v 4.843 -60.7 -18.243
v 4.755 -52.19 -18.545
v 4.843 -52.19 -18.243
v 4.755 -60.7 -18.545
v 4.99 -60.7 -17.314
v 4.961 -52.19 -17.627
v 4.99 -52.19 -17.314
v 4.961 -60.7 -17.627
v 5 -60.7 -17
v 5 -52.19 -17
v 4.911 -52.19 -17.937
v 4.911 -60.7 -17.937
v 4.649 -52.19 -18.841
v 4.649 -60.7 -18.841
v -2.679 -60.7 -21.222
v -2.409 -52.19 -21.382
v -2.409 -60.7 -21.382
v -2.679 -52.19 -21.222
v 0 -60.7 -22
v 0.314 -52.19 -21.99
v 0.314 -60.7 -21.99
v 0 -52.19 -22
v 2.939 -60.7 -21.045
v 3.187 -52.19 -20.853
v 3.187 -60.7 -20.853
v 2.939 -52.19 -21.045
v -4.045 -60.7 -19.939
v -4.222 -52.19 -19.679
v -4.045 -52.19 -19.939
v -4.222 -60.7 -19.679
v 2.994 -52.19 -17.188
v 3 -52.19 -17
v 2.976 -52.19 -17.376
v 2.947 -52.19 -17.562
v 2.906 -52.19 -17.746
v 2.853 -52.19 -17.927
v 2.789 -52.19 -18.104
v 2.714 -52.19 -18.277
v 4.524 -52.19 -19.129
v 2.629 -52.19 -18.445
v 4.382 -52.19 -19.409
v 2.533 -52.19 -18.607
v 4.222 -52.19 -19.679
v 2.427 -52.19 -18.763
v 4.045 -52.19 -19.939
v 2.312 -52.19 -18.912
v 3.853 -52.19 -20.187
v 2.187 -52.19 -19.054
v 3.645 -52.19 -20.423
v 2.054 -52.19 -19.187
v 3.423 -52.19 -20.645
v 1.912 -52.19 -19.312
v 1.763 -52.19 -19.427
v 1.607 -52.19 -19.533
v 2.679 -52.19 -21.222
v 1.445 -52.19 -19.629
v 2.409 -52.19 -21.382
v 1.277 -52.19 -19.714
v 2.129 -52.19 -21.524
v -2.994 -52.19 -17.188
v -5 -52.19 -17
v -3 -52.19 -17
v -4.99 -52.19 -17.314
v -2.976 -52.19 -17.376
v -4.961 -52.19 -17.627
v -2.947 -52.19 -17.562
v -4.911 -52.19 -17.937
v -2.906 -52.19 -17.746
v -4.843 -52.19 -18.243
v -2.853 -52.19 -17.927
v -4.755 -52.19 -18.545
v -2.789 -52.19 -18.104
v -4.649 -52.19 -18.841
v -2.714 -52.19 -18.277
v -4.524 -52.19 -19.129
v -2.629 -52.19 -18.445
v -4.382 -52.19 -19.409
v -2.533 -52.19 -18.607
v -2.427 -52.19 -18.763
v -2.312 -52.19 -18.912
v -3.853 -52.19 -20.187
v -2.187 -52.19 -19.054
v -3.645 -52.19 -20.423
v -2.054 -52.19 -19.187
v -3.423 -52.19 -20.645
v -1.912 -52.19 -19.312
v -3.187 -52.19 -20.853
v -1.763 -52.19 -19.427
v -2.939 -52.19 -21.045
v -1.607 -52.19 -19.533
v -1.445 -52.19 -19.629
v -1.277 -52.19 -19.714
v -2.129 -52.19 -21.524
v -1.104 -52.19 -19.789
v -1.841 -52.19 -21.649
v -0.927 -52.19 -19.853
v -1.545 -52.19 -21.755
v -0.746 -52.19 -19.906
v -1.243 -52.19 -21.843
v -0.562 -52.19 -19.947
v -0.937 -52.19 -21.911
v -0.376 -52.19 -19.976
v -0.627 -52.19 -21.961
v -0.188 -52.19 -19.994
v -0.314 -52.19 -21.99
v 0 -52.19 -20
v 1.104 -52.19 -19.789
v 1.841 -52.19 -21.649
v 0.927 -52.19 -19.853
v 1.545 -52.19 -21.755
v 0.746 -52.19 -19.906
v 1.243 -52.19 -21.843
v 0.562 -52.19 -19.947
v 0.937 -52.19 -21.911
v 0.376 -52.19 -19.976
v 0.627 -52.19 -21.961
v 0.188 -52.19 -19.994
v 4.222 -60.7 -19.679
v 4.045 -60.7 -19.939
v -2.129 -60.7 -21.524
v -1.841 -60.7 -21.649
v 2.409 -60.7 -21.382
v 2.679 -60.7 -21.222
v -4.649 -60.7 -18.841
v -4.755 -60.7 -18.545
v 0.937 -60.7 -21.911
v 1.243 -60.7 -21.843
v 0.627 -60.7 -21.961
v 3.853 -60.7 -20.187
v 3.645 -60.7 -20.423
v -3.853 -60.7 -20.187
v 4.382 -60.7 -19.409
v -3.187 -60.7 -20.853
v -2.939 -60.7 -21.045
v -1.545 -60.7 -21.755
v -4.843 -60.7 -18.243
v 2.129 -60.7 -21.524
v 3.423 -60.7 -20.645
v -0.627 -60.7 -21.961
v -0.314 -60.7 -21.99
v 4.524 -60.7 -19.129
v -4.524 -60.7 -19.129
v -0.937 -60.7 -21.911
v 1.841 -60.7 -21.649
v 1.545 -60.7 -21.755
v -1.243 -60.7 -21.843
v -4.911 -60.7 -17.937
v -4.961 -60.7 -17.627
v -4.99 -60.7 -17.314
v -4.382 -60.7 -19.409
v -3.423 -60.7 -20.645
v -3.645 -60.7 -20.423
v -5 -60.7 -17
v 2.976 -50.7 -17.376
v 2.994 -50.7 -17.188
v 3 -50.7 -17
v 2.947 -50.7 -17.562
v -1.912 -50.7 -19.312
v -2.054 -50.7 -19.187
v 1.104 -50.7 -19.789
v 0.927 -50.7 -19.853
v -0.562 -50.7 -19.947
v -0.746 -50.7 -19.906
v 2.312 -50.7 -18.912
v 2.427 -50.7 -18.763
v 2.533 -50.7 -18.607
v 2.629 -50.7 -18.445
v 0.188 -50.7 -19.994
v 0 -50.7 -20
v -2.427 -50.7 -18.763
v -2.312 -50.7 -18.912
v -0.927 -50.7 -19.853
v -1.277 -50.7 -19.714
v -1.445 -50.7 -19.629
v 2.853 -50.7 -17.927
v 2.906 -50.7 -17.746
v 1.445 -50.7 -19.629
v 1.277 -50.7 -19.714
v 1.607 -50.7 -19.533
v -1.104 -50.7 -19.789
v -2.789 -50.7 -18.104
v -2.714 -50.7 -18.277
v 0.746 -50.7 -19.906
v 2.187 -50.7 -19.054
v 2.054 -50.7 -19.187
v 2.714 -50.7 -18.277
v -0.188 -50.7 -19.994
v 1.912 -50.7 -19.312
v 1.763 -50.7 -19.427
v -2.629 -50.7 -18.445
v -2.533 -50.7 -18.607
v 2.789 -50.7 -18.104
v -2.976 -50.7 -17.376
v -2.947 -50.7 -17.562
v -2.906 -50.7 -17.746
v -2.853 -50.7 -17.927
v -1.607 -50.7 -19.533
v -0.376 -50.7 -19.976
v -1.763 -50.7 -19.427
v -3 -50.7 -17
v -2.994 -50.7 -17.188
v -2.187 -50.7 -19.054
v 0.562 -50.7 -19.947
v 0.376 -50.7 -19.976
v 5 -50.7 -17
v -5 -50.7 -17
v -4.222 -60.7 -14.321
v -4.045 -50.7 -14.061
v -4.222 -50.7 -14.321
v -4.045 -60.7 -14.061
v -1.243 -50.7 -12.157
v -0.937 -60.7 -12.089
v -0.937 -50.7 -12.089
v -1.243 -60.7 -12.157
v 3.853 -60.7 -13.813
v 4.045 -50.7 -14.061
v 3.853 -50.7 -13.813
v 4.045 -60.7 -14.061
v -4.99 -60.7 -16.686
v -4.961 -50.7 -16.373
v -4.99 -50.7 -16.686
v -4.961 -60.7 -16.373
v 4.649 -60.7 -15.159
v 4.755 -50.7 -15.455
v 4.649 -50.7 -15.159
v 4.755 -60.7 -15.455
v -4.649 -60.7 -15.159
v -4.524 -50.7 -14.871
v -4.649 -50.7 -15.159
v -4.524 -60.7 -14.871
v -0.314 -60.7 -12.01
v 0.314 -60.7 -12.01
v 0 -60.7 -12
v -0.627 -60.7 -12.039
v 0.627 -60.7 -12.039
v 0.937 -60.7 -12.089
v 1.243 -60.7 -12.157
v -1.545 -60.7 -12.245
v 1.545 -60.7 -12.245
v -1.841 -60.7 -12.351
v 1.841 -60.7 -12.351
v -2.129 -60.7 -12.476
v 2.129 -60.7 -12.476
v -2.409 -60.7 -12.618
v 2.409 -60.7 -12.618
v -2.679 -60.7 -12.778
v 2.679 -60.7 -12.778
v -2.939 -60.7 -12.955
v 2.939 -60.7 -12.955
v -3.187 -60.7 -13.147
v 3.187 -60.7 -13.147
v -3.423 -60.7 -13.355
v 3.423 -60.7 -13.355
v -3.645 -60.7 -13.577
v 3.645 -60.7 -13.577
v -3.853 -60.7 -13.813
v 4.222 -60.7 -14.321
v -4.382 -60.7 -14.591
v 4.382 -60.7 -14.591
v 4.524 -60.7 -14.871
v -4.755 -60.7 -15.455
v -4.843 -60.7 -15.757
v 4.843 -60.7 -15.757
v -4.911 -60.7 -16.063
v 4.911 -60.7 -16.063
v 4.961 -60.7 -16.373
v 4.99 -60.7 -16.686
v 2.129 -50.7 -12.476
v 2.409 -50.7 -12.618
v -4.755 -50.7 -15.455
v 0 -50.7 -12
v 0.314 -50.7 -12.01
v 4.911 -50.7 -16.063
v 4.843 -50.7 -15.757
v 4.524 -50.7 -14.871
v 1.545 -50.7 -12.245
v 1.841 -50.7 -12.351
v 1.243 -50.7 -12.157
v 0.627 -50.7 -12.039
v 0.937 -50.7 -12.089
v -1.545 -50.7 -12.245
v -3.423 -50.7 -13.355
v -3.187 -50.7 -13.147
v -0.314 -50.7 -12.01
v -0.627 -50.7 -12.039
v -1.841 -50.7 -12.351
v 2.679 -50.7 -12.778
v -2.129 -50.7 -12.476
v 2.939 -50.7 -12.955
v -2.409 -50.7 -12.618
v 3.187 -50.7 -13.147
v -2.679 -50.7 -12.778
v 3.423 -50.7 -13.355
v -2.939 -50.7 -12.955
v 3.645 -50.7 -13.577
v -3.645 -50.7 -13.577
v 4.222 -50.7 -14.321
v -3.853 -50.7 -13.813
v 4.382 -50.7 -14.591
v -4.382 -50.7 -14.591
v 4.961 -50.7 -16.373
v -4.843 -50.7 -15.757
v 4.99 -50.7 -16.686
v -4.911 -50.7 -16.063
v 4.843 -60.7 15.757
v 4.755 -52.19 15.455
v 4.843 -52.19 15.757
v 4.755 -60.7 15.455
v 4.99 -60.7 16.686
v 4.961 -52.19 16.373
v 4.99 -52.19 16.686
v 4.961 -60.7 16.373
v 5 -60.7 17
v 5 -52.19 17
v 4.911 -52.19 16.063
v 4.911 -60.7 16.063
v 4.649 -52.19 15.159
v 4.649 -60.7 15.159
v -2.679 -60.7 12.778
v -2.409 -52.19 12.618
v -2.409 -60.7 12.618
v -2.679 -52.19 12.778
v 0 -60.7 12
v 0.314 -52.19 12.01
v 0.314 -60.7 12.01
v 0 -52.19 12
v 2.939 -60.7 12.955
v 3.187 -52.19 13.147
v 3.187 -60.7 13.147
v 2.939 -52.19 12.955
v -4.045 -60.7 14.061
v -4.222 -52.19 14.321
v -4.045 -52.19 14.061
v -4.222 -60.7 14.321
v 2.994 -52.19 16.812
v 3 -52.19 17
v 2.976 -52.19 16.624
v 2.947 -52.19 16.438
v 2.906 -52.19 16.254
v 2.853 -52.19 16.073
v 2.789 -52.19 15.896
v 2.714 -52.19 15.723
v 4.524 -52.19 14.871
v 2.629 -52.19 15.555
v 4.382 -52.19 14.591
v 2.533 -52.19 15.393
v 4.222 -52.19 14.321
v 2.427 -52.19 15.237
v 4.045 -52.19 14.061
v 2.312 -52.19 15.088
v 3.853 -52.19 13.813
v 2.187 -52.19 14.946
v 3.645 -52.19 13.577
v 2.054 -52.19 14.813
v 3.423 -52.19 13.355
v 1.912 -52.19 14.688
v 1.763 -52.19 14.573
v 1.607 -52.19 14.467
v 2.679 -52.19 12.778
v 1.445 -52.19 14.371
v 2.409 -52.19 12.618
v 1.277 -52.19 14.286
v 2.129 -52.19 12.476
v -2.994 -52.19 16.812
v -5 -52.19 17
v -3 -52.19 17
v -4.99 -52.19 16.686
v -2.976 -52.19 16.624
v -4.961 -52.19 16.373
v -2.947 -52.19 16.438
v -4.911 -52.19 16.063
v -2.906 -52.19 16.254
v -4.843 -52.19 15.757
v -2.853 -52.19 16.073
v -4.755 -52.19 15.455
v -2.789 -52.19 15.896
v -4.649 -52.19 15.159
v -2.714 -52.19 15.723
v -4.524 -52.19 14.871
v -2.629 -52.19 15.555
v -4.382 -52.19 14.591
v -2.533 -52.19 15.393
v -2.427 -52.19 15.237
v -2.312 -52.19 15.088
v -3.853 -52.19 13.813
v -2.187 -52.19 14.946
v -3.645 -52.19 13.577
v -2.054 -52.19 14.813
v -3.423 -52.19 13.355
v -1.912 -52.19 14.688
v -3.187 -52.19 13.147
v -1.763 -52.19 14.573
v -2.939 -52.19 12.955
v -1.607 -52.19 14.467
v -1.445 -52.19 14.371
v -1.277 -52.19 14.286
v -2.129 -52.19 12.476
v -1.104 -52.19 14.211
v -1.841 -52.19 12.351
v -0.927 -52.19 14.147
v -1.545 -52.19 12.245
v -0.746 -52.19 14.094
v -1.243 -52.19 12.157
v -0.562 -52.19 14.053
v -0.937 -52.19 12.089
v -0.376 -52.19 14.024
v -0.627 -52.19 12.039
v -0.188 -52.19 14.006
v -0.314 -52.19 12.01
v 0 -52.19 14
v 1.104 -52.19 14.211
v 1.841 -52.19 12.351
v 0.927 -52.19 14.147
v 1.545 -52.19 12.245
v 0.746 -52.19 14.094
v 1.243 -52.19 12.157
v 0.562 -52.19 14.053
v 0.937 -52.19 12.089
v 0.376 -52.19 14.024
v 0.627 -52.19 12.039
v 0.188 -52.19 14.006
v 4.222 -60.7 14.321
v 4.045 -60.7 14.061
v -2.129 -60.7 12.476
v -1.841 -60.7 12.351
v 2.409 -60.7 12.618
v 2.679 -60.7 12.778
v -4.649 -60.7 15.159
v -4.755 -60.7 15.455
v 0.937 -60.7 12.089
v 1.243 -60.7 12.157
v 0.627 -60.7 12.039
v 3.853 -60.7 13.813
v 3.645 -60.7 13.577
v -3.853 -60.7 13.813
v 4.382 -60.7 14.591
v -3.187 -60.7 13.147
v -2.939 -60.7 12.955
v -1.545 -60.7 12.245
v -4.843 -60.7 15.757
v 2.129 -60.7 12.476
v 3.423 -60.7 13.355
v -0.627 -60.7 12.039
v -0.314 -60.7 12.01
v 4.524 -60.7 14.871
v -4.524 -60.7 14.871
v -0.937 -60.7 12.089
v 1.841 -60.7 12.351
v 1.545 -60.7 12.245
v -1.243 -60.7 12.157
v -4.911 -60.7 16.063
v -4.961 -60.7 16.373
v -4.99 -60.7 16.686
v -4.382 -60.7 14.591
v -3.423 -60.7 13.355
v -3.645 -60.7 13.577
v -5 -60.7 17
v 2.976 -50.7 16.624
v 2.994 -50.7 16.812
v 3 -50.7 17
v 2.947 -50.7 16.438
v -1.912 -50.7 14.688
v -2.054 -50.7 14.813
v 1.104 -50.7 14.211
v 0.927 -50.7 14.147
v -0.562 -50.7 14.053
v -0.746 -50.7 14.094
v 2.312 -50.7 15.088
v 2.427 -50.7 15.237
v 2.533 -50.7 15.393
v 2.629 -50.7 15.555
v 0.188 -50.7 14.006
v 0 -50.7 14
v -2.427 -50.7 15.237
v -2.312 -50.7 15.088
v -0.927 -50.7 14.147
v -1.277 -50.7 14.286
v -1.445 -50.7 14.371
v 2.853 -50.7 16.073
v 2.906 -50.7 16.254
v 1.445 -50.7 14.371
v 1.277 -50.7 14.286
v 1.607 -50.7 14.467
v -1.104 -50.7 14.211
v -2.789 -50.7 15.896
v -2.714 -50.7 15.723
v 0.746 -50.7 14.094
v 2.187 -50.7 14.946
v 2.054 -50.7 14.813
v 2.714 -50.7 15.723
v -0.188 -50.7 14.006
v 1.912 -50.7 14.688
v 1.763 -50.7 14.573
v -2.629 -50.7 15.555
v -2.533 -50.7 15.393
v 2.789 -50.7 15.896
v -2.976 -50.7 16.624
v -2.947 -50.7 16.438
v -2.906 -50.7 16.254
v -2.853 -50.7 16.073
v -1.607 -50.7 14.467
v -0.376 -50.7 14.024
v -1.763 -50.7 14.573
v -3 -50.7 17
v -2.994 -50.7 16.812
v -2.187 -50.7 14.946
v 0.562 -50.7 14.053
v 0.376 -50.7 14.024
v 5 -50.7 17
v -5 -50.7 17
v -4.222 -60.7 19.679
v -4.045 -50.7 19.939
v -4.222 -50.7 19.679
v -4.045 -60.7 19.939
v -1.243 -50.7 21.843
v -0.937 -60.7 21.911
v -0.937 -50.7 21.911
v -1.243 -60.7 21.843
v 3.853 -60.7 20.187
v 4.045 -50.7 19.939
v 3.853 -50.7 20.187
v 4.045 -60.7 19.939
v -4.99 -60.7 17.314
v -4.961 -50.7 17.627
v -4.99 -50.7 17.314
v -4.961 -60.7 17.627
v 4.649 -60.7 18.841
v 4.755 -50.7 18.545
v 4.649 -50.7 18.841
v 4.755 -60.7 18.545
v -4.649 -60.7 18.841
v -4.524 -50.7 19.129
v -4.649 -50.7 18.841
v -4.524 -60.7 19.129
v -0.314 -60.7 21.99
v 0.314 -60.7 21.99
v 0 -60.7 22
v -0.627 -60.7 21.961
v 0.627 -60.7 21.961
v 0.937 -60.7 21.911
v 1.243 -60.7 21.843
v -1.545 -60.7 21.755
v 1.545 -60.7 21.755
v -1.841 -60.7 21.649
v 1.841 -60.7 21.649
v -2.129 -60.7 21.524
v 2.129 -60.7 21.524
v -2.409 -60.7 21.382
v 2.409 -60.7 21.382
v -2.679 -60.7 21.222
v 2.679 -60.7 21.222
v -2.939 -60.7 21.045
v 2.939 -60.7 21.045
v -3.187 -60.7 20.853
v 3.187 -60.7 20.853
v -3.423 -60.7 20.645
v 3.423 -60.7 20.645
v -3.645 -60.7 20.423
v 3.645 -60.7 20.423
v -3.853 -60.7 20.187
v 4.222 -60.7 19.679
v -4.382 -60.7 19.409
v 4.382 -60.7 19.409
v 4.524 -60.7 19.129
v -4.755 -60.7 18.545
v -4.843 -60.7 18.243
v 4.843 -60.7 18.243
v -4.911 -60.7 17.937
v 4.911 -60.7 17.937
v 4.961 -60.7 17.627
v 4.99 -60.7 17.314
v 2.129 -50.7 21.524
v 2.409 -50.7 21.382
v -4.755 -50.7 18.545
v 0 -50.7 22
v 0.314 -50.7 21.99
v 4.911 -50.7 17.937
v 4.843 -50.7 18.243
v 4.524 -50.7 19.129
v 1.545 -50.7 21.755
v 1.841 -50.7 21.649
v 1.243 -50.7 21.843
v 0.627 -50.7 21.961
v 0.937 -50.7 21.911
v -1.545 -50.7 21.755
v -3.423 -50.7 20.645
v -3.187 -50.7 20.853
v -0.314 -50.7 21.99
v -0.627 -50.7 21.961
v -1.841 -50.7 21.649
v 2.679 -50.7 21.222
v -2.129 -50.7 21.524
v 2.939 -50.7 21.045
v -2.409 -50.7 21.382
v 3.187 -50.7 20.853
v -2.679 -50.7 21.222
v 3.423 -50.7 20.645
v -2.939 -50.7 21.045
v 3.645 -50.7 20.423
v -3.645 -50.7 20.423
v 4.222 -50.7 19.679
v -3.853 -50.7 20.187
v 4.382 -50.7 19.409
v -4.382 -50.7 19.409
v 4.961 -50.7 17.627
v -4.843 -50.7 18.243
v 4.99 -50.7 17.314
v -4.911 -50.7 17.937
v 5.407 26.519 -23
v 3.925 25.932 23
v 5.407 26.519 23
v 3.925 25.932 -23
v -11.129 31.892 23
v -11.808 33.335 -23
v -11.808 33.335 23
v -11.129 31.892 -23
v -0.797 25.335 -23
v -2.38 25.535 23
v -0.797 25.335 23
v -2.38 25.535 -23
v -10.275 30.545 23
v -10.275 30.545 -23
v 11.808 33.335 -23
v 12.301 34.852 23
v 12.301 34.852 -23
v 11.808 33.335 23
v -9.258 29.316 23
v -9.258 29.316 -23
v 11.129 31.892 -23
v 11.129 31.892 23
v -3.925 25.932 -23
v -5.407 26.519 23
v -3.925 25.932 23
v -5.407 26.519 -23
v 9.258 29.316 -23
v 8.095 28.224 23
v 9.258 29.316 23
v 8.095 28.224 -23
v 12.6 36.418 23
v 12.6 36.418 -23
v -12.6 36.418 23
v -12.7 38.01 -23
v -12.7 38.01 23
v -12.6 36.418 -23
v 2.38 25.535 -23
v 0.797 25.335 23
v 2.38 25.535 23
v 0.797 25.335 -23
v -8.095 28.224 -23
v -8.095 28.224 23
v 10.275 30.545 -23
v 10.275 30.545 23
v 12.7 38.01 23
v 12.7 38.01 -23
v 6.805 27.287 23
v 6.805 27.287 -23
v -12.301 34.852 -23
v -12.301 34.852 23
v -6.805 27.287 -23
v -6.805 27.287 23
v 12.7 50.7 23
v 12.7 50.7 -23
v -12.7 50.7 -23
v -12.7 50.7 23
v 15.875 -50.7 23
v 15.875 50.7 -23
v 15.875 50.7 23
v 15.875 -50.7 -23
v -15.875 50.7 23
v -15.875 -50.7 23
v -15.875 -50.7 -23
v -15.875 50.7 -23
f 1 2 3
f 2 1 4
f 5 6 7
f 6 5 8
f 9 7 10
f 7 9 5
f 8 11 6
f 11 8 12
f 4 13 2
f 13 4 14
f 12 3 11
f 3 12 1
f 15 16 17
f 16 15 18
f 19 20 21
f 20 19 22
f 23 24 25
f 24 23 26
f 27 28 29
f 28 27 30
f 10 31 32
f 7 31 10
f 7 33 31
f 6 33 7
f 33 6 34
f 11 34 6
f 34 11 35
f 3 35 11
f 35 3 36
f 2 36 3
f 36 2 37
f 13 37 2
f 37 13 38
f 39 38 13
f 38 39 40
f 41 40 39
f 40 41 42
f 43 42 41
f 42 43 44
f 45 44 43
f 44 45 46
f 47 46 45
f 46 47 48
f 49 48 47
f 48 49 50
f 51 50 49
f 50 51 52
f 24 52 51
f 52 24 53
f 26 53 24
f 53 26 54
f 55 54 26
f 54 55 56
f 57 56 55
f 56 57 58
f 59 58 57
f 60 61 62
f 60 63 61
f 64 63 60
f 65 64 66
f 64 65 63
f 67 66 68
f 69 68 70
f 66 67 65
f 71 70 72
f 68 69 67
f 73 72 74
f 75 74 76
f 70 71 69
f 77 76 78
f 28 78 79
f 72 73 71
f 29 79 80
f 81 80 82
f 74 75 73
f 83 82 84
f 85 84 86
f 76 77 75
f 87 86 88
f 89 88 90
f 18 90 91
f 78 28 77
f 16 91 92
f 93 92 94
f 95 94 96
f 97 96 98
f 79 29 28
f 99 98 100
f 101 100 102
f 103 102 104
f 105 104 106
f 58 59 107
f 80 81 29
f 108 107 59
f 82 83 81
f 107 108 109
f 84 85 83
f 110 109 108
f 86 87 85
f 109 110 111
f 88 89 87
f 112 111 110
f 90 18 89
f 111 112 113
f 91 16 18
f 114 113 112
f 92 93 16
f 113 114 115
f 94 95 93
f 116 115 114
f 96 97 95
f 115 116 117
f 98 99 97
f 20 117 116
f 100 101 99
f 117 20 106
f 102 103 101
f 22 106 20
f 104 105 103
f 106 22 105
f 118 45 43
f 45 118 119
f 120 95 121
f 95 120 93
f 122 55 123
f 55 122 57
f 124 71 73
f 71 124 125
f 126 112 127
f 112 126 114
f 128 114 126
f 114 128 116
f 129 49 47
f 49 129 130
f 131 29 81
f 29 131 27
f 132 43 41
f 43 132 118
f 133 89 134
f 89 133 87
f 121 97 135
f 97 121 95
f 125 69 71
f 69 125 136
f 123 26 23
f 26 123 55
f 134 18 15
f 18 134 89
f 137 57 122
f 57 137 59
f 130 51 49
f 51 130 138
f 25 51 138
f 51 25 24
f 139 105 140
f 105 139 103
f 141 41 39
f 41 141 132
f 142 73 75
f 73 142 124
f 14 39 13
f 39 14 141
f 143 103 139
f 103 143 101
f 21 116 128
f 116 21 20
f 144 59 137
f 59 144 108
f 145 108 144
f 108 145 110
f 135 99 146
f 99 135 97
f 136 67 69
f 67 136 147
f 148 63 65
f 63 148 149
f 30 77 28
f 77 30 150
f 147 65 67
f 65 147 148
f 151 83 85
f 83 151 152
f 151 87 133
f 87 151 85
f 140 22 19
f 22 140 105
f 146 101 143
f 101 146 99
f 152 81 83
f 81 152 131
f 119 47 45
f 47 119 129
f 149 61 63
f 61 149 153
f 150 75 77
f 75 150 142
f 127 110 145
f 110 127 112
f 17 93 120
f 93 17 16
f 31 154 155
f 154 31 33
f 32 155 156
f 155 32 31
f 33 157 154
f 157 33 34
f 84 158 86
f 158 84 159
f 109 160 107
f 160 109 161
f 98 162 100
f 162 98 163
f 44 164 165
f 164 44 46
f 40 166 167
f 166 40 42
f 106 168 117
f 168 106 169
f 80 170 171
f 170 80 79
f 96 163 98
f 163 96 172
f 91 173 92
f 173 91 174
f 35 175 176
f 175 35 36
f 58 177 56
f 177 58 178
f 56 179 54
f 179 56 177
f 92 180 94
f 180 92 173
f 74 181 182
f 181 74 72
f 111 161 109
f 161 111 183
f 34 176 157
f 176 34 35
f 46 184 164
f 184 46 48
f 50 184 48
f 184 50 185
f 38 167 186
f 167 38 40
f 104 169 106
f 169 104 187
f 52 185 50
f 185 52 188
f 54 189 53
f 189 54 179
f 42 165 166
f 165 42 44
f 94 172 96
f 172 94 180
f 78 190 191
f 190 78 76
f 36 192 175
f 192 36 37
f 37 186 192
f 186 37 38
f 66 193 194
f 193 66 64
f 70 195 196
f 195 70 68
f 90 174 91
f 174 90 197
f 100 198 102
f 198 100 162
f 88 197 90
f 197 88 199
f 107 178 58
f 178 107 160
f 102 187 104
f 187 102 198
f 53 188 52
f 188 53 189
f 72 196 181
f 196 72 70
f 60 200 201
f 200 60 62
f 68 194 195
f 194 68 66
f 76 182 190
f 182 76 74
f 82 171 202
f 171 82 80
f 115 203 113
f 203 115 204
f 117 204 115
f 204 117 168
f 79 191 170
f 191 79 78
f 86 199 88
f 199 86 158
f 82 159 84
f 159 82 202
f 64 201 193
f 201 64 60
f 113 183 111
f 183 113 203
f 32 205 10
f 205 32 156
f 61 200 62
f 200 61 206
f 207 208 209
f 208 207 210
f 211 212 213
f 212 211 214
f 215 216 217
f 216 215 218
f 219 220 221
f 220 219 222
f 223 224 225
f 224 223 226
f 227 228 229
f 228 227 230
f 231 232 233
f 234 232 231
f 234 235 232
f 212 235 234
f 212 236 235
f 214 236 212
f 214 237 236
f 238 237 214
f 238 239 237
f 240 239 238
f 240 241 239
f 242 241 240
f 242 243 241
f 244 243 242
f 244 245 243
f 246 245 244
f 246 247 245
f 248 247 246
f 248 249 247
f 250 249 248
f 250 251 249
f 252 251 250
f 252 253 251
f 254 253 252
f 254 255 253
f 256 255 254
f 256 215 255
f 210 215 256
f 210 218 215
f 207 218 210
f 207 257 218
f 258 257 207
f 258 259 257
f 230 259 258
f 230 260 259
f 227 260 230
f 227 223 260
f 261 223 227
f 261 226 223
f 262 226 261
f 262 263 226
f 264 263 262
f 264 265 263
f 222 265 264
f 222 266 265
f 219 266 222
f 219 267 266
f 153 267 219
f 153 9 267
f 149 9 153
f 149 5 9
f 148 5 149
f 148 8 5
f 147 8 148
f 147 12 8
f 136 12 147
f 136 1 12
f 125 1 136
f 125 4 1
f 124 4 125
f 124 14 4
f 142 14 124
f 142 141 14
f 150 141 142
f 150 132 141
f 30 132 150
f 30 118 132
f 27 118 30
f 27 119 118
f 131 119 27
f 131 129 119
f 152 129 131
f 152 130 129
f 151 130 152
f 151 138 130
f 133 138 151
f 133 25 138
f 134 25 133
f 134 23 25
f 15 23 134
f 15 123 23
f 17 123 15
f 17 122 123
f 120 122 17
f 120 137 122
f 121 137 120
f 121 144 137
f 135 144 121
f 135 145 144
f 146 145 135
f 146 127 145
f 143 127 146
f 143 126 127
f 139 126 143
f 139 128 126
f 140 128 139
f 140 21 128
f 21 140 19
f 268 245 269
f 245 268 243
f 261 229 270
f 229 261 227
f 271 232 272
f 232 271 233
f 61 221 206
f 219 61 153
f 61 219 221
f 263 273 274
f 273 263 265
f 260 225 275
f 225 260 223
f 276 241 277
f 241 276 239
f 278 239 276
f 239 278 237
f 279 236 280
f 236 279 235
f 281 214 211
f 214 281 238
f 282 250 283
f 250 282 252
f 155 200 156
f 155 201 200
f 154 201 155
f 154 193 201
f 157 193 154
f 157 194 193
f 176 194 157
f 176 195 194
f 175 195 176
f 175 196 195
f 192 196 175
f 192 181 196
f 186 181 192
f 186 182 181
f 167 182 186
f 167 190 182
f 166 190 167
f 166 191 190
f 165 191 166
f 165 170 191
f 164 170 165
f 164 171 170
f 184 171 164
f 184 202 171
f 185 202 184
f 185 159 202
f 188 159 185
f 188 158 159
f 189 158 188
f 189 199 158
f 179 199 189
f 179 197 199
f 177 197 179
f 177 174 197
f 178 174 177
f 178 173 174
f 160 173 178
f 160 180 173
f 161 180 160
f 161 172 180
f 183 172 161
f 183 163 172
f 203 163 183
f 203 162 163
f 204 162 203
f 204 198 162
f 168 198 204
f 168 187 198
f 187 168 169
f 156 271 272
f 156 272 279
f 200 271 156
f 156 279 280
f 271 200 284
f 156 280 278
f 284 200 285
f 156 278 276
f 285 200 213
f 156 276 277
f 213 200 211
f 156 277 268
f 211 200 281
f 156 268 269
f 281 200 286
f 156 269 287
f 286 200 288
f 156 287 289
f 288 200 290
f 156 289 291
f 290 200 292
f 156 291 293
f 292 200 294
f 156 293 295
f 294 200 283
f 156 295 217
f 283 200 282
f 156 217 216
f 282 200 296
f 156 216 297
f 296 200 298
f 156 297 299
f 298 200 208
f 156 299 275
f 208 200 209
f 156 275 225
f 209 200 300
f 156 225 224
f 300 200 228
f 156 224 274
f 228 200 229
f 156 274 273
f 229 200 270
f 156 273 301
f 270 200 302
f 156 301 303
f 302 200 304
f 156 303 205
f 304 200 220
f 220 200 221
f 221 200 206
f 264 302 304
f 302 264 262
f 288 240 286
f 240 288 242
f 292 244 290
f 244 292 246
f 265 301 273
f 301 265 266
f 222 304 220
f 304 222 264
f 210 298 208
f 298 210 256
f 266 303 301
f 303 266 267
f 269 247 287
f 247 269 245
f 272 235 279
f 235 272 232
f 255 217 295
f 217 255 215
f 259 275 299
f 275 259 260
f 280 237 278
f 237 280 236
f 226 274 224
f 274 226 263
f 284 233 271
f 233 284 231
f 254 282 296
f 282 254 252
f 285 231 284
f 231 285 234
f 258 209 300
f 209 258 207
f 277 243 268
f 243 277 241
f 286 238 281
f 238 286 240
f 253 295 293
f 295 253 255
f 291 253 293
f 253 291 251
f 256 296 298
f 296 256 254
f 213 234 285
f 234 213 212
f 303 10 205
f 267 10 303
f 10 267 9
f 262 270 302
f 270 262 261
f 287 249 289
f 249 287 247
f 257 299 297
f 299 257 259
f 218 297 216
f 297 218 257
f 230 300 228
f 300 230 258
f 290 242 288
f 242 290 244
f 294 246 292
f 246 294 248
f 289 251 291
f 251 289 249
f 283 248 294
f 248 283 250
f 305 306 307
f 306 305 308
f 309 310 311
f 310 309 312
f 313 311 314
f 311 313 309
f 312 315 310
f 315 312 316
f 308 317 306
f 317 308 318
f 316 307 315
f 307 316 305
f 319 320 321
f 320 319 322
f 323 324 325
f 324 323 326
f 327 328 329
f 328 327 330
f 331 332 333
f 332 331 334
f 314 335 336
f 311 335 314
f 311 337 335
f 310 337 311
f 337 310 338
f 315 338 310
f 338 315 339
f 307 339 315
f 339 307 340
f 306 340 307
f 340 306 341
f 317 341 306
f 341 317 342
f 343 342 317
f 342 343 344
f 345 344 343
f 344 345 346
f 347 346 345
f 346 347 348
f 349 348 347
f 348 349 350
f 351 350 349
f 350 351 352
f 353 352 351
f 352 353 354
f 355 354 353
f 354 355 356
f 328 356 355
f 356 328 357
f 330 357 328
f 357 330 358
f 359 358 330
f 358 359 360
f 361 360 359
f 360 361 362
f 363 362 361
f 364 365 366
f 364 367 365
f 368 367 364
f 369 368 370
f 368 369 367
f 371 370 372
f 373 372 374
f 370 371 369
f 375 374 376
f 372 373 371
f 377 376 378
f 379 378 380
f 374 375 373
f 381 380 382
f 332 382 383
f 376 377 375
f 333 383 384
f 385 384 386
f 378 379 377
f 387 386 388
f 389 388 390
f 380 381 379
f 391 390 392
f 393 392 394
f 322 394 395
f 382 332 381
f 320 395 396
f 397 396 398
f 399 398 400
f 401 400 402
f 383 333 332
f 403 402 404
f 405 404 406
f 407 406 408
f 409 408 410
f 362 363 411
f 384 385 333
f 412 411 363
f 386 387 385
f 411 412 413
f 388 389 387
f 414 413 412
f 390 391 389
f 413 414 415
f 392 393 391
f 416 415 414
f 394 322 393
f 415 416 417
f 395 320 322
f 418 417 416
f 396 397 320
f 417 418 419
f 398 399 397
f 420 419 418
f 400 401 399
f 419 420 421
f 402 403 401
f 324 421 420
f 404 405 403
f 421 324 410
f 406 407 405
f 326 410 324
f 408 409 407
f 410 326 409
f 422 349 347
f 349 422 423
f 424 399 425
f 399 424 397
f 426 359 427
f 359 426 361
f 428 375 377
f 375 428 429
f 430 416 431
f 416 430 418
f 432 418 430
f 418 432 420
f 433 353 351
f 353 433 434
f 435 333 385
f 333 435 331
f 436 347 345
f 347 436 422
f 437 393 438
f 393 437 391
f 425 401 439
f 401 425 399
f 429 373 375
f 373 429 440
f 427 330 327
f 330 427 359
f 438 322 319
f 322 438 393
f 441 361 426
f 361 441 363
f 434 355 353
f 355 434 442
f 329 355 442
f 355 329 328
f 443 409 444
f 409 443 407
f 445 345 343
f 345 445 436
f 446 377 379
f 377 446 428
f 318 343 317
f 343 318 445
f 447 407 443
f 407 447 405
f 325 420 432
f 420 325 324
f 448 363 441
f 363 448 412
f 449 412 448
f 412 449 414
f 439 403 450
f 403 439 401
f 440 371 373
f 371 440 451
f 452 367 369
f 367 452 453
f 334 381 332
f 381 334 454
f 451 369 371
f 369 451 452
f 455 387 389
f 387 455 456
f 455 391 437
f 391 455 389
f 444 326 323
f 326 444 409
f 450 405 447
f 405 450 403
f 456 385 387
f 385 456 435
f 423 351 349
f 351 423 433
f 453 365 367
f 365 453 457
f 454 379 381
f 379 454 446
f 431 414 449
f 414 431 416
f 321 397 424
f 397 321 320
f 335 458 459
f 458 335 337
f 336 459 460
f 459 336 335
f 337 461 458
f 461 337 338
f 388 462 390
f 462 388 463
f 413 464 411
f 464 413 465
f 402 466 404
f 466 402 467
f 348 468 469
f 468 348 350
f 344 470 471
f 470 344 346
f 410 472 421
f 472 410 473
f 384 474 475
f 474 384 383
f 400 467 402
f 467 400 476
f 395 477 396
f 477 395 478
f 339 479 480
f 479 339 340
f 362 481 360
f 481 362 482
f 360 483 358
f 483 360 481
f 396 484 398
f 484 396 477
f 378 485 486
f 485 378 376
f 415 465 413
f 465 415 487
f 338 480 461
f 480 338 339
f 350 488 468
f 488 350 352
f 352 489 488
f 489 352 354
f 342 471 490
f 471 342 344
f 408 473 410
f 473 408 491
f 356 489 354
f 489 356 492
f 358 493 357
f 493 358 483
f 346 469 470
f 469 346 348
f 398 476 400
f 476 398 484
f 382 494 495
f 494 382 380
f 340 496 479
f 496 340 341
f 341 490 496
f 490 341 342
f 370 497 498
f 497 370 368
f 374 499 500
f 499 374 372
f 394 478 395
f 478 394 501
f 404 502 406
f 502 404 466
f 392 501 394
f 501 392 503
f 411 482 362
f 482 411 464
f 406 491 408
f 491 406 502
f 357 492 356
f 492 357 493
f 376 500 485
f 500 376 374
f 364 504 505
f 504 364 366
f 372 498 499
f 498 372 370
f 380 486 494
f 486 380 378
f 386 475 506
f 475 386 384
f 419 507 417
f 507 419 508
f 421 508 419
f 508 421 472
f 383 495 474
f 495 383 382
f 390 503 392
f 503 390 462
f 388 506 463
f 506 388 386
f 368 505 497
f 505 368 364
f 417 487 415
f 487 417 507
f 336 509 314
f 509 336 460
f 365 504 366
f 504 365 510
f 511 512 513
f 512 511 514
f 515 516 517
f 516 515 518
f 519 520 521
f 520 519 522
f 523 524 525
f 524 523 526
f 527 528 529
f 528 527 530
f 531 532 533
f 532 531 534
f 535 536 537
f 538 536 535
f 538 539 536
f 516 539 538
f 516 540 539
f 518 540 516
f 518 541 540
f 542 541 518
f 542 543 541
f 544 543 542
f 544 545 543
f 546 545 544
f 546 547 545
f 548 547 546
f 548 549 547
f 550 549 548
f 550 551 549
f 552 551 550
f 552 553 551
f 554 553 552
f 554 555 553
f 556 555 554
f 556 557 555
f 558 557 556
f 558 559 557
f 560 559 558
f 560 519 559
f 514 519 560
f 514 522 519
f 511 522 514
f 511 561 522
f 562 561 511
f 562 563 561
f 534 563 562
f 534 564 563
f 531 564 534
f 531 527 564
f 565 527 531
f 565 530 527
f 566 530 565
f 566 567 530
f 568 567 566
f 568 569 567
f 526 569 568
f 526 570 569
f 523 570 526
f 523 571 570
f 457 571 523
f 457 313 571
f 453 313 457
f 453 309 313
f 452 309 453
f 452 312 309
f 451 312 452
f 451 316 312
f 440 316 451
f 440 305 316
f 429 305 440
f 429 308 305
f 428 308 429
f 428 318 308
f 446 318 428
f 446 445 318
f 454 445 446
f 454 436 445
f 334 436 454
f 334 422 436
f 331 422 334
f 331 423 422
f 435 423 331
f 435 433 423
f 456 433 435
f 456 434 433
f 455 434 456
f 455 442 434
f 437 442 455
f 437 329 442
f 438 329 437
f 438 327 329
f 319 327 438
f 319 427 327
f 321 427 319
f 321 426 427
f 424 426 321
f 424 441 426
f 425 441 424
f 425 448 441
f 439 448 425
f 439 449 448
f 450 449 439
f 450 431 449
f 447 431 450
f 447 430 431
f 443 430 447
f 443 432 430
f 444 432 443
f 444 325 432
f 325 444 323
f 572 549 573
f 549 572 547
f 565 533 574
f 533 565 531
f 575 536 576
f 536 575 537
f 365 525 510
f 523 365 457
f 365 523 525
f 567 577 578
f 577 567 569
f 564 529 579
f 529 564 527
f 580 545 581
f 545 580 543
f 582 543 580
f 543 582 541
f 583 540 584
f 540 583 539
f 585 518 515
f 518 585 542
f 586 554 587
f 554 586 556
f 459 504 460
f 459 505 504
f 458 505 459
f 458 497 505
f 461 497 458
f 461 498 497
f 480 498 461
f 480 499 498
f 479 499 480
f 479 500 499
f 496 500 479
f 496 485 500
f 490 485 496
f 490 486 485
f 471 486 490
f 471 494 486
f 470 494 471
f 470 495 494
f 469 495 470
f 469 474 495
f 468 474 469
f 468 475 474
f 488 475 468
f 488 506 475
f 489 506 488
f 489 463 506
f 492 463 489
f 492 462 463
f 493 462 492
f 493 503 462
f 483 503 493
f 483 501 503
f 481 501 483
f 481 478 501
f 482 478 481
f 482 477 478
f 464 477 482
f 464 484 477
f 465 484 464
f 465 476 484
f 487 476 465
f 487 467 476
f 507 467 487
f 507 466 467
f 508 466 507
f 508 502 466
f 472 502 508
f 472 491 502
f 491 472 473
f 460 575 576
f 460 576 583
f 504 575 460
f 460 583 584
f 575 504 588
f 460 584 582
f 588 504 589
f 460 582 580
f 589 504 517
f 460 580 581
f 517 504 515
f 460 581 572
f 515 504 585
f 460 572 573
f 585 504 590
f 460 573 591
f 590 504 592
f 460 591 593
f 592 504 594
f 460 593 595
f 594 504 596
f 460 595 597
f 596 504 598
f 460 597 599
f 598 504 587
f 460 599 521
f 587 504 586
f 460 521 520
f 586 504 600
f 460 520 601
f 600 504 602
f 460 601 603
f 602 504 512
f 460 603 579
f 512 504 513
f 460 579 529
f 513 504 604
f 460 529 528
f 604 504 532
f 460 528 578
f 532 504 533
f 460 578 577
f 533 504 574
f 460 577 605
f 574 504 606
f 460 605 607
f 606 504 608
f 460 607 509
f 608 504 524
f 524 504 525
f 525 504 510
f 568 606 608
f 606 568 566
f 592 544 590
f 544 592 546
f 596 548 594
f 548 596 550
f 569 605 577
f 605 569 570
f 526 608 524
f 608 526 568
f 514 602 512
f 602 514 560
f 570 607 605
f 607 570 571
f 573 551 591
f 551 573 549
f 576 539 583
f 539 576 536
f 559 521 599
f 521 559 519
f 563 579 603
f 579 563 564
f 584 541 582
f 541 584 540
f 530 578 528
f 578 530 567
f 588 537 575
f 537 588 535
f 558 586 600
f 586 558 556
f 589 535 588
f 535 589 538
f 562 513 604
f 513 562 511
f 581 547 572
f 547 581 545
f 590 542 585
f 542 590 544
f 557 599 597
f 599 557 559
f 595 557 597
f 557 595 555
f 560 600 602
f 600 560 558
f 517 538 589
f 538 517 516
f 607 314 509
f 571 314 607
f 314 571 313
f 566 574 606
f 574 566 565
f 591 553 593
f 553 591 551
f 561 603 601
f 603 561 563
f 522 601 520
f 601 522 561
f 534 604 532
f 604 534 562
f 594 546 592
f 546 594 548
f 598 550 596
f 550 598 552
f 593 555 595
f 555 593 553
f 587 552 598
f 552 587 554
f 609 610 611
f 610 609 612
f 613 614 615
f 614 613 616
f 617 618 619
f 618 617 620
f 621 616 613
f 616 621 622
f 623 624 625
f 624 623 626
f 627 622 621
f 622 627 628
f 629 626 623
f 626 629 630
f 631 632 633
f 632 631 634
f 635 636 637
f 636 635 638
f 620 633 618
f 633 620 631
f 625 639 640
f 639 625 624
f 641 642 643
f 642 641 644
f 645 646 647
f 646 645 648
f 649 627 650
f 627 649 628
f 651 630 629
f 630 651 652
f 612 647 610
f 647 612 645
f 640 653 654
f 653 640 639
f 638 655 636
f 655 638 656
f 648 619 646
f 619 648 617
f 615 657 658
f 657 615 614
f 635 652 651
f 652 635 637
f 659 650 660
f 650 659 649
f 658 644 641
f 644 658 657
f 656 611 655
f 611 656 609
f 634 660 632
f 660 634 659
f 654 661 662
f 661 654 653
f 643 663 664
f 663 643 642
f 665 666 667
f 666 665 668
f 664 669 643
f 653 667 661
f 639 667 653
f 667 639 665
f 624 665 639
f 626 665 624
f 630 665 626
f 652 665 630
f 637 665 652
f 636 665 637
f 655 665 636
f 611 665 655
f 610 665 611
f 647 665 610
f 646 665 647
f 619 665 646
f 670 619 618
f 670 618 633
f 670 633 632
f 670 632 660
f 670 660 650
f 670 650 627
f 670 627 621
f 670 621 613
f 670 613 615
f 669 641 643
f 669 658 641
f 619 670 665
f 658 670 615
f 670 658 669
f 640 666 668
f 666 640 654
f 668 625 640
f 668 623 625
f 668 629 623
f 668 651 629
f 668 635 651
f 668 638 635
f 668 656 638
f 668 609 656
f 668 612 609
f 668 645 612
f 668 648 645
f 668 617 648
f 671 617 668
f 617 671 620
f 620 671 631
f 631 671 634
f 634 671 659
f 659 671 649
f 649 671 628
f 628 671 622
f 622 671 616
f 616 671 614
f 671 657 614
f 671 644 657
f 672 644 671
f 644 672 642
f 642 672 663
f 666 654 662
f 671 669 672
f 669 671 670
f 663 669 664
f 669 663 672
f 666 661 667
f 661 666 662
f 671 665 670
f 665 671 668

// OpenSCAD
// THe total height of the barrel holder (in mm).
$holderHeight = 46; // [20:100]

// The spacing from the back of the safe to the beginning of where the barrel will rest (in mm) **Note:** The typical Vaultek spacers are ~38mm, so if your replacing 1 spacer 38mm is a good start.
$spacingToBarrel = 76; // [10:150]

// The barrel diameter (in mm).
$barrelDiameter = 25.4; // [10:50]

{}

$totalWidth = $barrelDiameter*1.25;

$depth = $spacingToBarrel + $barrelDiameter;

translate([0,-$depth/2,0])
accessoryBaseWithPins($totalWidth,$holderHeight,0);

difference() {
    cube([$totalWidth,$depth,$holderHeight], center = true);
    translate([0,$depth/2 - $barrelDiameter/2 + 0.01,0])
        group() {
            cylinder(h = $holderHeight + 0.1, d = $barrelDiameter, center = true, $fn = 50);

            translate([0,$barrelDiameter/4,0])
            cube([$barrelDiameter, $barrelDiameter/2, $holderHeight+0.1], center = true);
        }
}

/******** Functions/Modules **********/

// Module: accessoryBaseWithPins
// Generates a rectangular base with evenly spaced pins on its top surface.
// The pins are arranged in a grid pattern, and their number is calculated
// based on the dimensions of the base and the spacing between pins.
//
// Parameters:
// - baseWidth (number): The width of the base in the X direction.
// - baseHeight (number): The height of the base in the Y direction.
// - baseThickness (number): The thickness of the base in the Z direction.
module accessoryBaseWithPins(baseWidth, baseHeight, baseThickness) {
    $fn = 100;
    
    // Pin Parameters
    pinDiameter = pinDiameter();
    pinHeight = pinHeight();
    pinSpacingX = pinXSpacing();
    pinSpacingY = pinYSpacing();
    cutoutThickness = 1.5;

    // Calculate number of pins
    numPinsX = calculateColumnsOfPins(baseWidth);
    numPinsY = calculateRowsOfPins(baseHeight);

    // Total span of pins
    totalSpanX = (numPinsX - 1) * pinSpacingX;
    totalSpanY = (numPinsY - 1) * pinSpacingY;

    difference() {
        // Pins centered on top face
        rotate([90, 0, 0])
        for (i = [0 : numPinsX - 1])
            for (j = [0 : numPinsY - 1]) {
                xOffset = -totalSpanX / 2 + i * pinSpacingX;
                zOffset = -totalSpanY / 2 + j * pinSpacingY;
                translate([xOffset, zOffset, pinHeight / 2 + baseThickness / 2])
                    difference() {
                        rotate([0, 180, 180])
                        pin();
                    }
            }
    }

    // Base
    cube([baseWidth, baseThickness, baseHeight], center = true);
}

// Module: pin
// Creates a single pin with a cylindrical shape and a cutout on its top surface.
// The cutout is a washer-like structure with a half-cylinder removed.
//
// Parameters:
// - pinDiameter (number): The diameter of the pin.
// - pinHeight (number): The height of the pin.
// - cutoutThickness (number): The thickness of the washer-like cutout on the top of the pin.
module pin(pinDiameter = pinDiameter(), pinHeight = pinHeight(), cutoutThickness = pinCutoutThickness()) {
    $fn = 100;
    $innerD = 6;
    
    difference() {
        cylinder(h = pinHeight, r = pinDiameter / 2, center = true);

        translate([0, 0, pinHeight / 2 - cutoutThickness / 2 + 0.01])
        difference() {
            // Full washer
            cylinder(h = cutoutThickness, r = pinDiameter / 2, center = true);
                
            // Slightly taller to ensure clean subtraction
            cylinder(h = cutoutThickness, r = $innerD / 2, center = true);

            // Cut it in half
            translate([-pinDiameter / 2, -pinDiameter / 2, -cutoutThickness])
            cube([pinDiameter, pinDiameter / 2, cutoutThickness * 2]);
        }
    }
}

// Module: barrelHolderShelf
// Creates a shelf designed to slip over the barrel holders.
//
// Parameters:
// - shelfWidth (number): The total width of the shelf (in mm).
// - shelfDepth (number): The depth of the shelf (in mm).
// - shelfThickness (number): The thickness shelf (in mm).
// - notchWidth (number): The width of the notch used to slip over the barrel holder.
// - notchHeight (number): The height of the notch used to slip over the barrel holder.
module barrelHolderShelf(shelfWidth, shelfDepth, shelfThickness, notchWidth, notchHeight) {
linear_extrude(shelfDepth)
polygon(points=[
    [0,0], 
    [shelfWidth,0], 
    [shelfWidth,-shelfThickness], 
    [shelfWidth/2+notchWidth/2,-notchHeight-shelfThickness],
    [shelfWidth/2+notchWidth/2,-shelfThickness],
    [shelfWidth/2-notchWidth/2,-shelfThickness],
    [shelfWidth/2-notchWidth/2,-notchHeight-shelfThickness],
    [0,-shelfThickness], 
]);
}

function pinDiameter() = 10;
function pinHeight() = 10;
function pinXSpacing() = 22;
function pinYSpacing() = 34;
function pinCutoutThickness() = 1.5;
function calculateRowsOfPins(distance) = max(1, ceil((distance-pinDiameter()) / pinYSpacing()));
function calculateColumnsOfPins(distance) = max(1, ceil((distance-pinDiameter()) / pinXSpacing()));
